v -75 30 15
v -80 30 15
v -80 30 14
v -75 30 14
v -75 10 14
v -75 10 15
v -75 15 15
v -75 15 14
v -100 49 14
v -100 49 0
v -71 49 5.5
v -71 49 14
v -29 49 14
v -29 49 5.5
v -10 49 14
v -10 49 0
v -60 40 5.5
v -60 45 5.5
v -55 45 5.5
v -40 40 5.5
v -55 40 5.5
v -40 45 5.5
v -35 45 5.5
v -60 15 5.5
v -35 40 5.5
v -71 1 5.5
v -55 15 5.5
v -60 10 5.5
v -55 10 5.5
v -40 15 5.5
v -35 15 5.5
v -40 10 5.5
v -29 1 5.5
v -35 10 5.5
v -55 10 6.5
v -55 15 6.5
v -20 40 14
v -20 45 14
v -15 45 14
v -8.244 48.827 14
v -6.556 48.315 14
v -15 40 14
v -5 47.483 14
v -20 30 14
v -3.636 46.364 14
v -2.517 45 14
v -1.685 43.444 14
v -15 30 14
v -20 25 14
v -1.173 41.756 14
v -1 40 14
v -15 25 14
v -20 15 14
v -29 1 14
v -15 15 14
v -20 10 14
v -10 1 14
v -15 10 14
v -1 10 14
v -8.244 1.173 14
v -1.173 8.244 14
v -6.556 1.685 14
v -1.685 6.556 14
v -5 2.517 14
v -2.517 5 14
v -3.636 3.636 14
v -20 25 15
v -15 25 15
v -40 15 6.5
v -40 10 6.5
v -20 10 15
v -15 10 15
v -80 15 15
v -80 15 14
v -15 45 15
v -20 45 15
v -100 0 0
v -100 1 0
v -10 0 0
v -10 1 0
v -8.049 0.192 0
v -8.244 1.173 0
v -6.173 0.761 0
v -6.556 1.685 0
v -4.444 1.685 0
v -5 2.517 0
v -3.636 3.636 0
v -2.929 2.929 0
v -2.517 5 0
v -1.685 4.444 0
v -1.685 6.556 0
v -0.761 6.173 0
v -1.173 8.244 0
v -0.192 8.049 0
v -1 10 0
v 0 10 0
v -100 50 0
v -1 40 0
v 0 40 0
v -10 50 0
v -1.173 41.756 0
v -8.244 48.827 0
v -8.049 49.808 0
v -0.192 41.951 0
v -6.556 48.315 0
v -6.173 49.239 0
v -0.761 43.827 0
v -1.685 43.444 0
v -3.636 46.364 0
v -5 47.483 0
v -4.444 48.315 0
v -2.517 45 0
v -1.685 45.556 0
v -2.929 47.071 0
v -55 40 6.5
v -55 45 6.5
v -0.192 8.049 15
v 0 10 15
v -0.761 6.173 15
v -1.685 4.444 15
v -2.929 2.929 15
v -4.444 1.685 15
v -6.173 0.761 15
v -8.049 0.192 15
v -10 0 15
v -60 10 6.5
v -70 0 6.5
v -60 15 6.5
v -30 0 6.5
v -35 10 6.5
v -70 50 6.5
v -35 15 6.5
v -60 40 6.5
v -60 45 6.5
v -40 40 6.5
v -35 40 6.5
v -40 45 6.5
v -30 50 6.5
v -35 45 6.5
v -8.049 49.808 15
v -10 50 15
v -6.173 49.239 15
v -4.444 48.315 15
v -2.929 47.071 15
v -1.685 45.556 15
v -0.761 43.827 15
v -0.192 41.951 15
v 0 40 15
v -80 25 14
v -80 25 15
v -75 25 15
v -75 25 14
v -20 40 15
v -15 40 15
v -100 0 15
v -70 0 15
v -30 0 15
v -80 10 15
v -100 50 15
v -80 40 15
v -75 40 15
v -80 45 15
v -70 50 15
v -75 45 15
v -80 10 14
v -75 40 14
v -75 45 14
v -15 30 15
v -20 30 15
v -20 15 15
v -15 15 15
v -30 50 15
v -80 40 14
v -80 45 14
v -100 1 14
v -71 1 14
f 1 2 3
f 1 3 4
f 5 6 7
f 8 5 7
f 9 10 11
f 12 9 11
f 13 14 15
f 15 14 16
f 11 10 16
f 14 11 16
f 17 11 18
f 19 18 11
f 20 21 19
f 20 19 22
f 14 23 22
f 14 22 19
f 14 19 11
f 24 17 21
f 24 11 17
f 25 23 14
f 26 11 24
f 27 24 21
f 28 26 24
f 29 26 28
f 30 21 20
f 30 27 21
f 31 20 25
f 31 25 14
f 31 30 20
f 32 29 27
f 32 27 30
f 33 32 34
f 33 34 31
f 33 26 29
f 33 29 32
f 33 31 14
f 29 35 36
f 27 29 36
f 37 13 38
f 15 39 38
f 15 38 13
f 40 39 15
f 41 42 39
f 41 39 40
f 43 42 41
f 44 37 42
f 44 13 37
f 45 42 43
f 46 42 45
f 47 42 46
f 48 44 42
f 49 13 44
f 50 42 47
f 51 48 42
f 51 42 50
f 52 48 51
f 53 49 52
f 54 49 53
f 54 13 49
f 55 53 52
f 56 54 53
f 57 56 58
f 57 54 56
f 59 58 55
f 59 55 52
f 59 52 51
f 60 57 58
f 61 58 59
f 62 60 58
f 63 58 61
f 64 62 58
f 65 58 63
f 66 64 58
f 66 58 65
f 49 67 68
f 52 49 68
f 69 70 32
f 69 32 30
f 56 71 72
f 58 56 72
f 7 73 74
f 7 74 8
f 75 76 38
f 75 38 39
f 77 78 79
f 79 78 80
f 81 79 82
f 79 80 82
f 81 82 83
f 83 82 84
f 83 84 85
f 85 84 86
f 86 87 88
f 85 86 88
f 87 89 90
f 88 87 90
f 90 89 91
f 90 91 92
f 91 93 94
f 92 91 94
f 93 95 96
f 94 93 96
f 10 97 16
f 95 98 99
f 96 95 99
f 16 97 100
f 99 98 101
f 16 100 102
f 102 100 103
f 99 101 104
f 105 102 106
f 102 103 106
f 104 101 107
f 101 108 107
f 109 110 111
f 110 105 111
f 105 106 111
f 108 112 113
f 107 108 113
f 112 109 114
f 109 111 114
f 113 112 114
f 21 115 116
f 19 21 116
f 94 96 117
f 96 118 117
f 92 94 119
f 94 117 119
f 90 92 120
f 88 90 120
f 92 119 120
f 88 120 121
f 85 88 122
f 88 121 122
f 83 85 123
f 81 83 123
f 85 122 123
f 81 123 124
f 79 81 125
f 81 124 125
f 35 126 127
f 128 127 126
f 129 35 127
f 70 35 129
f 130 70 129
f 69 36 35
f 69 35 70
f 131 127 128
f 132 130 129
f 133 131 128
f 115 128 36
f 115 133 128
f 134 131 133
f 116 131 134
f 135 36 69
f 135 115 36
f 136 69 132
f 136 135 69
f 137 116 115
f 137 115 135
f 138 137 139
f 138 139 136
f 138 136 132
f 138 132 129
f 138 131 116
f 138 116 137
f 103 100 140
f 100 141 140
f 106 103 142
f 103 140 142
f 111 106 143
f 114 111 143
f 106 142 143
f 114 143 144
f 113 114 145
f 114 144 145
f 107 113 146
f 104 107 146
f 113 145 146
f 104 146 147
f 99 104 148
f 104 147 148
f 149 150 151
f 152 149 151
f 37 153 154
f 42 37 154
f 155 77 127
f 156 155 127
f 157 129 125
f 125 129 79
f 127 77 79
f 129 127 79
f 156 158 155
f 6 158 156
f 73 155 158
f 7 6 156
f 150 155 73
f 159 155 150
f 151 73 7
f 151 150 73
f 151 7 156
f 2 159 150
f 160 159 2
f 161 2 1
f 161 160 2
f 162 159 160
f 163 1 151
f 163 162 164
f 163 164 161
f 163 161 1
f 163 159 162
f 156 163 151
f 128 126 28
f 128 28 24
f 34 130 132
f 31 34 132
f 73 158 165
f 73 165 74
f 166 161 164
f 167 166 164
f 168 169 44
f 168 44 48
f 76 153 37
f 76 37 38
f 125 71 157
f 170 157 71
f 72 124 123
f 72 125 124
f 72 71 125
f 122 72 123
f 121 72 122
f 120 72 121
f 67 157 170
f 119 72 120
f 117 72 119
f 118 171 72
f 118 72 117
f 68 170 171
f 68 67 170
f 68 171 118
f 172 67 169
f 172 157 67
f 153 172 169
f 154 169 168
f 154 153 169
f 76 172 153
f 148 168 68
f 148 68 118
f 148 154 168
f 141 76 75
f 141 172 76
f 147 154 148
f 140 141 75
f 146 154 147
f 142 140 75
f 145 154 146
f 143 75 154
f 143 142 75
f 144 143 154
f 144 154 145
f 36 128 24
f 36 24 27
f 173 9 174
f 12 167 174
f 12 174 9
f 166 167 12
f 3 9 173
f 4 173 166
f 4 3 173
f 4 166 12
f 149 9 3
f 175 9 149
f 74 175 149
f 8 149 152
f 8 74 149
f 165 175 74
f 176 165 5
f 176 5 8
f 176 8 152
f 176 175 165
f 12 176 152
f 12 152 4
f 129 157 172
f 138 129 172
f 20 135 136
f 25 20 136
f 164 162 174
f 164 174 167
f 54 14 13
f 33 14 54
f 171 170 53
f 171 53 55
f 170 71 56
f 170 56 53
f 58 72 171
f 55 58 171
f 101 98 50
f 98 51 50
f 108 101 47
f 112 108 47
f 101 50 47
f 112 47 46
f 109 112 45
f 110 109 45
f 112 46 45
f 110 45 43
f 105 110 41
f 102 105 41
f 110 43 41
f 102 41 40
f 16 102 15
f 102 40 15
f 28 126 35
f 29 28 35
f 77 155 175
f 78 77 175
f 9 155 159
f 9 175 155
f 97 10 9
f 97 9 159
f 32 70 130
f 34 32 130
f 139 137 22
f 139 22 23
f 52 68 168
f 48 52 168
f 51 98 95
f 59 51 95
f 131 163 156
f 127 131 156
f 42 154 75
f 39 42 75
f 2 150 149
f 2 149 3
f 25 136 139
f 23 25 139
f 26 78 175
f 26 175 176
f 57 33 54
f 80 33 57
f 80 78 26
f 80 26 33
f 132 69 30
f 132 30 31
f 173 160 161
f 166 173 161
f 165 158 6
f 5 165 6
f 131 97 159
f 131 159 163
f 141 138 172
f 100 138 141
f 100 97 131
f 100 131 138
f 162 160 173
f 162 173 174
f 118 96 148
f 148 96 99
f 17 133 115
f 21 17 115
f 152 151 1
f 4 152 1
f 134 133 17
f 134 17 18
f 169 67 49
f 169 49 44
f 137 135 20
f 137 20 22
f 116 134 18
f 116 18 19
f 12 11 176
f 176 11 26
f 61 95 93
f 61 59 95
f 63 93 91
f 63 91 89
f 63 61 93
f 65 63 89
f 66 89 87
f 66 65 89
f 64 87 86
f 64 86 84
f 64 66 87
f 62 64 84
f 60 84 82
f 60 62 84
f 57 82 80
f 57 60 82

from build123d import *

# Parameters (mm, degrees)
F0_W     = 100
F0_H     = 50
F1_DEPTH = 15
F2_W     = 5
F2_H     = 5
F3_DEPTH = 8.5
F4_DEPTH = 15.001
F5_W     = 28
F5_H     = 48
F5_W_2   = 5
F5_H_2   = 5
F5_W_3   = 29
F6_DEPTH = 14
F5_W_4   = 42
F7_DEPTH = 5.5
F8_R     = 9
F9_R     = 10


with BuildPart() as f1:
    # F0 (on Top) → F1 (new body)
    with BuildSketch(Plane.XY):
        with Locations((-50, 25)):
            Rectangle(F0_W, F0_H)
    extrude(amount=F1_DEPTH)

    # F2 (on face) → F3 (cut)
    with BuildSketch(Plane.XY.offset(15)):
        Polygon((-30, 45), (-30, 50), (-70, 50), (-70, 0), (-30, 0), align=None)
        with Locations((-57.5, 12.5)):
            Rectangle(F2_W, F2_H, mode=Mode.SUBTRACT)
        with Locations((-37.5, 12.5)):
            Rectangle(F2_W, F2_H, mode=Mode.SUBTRACT)
        with Locations((-57.5, 42.5)):
            Rectangle(F2_W, F2_H, mode=Mode.SUBTRACT)
        with Locations((-37.5, 42.5)):
            Rectangle(F2_W, F2_H, mode=Mode.SUBTRACT)
    extrude(amount=-F3_DEPTH, mode=Mode.SUBTRACT)

    # F2 (on face) → F4 (cut, through all)
    with BuildSketch(Plane.XY.offset(15)):
        with Locations((-77.5, 42.5)):
            Rectangle(F2_W, F2_H)
        with Locations((-77.5, 27.5)):
            Rectangle(F2_W, F2_H)
        with Locations((-77.5, 12.5)):
            Rectangle(F2_W, F2_H)
        with Locations((-57.5, 12.5)):
            Rectangle(F2_W, F2_H)
        with Locations((-57.5, 42.5)):
            Rectangle(F2_W, F2_H)
        with Locations((-37.5, 42.5)):
            Rectangle(F2_W, F2_H)
        with Locations((-37.5, 12.5)):
            Rectangle(F2_W, F2_H)
        with Locations((-17.5, 12.5)):
            Rectangle(F2_W, F2_H)
        with Locations((-17.5, 27.5)):
            Rectangle(F2_W, F2_H)
        with Locations((-17.5, 42.5)):
            Rectangle(F2_W, F2_H)
    extrude(amount=-F4_DEPTH, mode=Mode.SUBTRACT)

    # F5 (on face) → F6 (cut)
    with BuildSketch(Plane(origin=(0, 0, 0), x_dir=(1, 0, 0), z_dir=(0, 0, -1))):
        with Locations((-15, -25)):
            Rectangle(F5_W, F5_H)
        with Locations((-17.5, -42.5)):
            Rectangle(F5_W_2, F5_H_2, mode=Mode.SUBTRACT)
        with Locations((-17.5, -27.5)):
            Rectangle(F5_W_2, F5_H_2, mode=Mode.SUBTRACT)
        with Locations((-17.5, -12.5)):
            Rectangle(F5_W_2, F5_H_2, mode=Mode.SUBTRACT)
        with Locations((-85.5, -25)):
            Rectangle(F5_W_3, F5_H)
        with Locations((-77.5, -42.5)):
            Rectangle(F5_W_2, F5_H_2, mode=Mode.SUBTRACT)
        with Locations((-77.5, -27.5)):
            Rectangle(F5_W_2, F5_H_2, mode=Mode.SUBTRACT)
        with Locations((-77.5, -12.5)):
            Rectangle(F5_W_2, F5_H_2, mode=Mode.SUBTRACT)
    extrude(amount=-F6_DEPTH, mode=Mode.SUBTRACT)

    # F5 (on face) → F7 (cut)
    with BuildSketch(Plane(origin=(0, 0, 0), x_dir=(1, 0, 0), z_dir=(0, 0, -1))):
        with Locations((-50, -25)):
            Rectangle(F5_W_4, F5_H)
        with Locations((-57.5, -42.5)):
            Rectangle(F5_W_2, F5_H_2, mode=Mode.SUBTRACT)
        with Locations((-37.5, -42.5)):
            Rectangle(F5_W_2, F5_H_2, mode=Mode.SUBTRACT)
        with Locations((-57.5, -12.5)):
            Rectangle(F5_W_2, F5_H_2, mode=Mode.SUBTRACT)
        with Locations((-37.5, -12.5)):
            Rectangle(F5_W_2, F5_H_2, mode=Mode.SUBTRACT)
    extrude(amount=-F7_DEPTH, mode=Mode.SUBTRACT)

    # F8
    f8_edges = [f1.edges().sort_by_distance(p)[0] for p in [
        (-1, 49, 7),
        (-1, 1, 7),
    ]]
    fillet(f8_edges, radius=F8_R)

    # F9
    f9_edges = [f1.edges().sort_by_distance(p)[0] for p in [
        (0, 50, 7.5),
        (0, 0, 7.5),
    ]]
    fillet(f9_edges, radius=F9_R)


solid = f1.part
